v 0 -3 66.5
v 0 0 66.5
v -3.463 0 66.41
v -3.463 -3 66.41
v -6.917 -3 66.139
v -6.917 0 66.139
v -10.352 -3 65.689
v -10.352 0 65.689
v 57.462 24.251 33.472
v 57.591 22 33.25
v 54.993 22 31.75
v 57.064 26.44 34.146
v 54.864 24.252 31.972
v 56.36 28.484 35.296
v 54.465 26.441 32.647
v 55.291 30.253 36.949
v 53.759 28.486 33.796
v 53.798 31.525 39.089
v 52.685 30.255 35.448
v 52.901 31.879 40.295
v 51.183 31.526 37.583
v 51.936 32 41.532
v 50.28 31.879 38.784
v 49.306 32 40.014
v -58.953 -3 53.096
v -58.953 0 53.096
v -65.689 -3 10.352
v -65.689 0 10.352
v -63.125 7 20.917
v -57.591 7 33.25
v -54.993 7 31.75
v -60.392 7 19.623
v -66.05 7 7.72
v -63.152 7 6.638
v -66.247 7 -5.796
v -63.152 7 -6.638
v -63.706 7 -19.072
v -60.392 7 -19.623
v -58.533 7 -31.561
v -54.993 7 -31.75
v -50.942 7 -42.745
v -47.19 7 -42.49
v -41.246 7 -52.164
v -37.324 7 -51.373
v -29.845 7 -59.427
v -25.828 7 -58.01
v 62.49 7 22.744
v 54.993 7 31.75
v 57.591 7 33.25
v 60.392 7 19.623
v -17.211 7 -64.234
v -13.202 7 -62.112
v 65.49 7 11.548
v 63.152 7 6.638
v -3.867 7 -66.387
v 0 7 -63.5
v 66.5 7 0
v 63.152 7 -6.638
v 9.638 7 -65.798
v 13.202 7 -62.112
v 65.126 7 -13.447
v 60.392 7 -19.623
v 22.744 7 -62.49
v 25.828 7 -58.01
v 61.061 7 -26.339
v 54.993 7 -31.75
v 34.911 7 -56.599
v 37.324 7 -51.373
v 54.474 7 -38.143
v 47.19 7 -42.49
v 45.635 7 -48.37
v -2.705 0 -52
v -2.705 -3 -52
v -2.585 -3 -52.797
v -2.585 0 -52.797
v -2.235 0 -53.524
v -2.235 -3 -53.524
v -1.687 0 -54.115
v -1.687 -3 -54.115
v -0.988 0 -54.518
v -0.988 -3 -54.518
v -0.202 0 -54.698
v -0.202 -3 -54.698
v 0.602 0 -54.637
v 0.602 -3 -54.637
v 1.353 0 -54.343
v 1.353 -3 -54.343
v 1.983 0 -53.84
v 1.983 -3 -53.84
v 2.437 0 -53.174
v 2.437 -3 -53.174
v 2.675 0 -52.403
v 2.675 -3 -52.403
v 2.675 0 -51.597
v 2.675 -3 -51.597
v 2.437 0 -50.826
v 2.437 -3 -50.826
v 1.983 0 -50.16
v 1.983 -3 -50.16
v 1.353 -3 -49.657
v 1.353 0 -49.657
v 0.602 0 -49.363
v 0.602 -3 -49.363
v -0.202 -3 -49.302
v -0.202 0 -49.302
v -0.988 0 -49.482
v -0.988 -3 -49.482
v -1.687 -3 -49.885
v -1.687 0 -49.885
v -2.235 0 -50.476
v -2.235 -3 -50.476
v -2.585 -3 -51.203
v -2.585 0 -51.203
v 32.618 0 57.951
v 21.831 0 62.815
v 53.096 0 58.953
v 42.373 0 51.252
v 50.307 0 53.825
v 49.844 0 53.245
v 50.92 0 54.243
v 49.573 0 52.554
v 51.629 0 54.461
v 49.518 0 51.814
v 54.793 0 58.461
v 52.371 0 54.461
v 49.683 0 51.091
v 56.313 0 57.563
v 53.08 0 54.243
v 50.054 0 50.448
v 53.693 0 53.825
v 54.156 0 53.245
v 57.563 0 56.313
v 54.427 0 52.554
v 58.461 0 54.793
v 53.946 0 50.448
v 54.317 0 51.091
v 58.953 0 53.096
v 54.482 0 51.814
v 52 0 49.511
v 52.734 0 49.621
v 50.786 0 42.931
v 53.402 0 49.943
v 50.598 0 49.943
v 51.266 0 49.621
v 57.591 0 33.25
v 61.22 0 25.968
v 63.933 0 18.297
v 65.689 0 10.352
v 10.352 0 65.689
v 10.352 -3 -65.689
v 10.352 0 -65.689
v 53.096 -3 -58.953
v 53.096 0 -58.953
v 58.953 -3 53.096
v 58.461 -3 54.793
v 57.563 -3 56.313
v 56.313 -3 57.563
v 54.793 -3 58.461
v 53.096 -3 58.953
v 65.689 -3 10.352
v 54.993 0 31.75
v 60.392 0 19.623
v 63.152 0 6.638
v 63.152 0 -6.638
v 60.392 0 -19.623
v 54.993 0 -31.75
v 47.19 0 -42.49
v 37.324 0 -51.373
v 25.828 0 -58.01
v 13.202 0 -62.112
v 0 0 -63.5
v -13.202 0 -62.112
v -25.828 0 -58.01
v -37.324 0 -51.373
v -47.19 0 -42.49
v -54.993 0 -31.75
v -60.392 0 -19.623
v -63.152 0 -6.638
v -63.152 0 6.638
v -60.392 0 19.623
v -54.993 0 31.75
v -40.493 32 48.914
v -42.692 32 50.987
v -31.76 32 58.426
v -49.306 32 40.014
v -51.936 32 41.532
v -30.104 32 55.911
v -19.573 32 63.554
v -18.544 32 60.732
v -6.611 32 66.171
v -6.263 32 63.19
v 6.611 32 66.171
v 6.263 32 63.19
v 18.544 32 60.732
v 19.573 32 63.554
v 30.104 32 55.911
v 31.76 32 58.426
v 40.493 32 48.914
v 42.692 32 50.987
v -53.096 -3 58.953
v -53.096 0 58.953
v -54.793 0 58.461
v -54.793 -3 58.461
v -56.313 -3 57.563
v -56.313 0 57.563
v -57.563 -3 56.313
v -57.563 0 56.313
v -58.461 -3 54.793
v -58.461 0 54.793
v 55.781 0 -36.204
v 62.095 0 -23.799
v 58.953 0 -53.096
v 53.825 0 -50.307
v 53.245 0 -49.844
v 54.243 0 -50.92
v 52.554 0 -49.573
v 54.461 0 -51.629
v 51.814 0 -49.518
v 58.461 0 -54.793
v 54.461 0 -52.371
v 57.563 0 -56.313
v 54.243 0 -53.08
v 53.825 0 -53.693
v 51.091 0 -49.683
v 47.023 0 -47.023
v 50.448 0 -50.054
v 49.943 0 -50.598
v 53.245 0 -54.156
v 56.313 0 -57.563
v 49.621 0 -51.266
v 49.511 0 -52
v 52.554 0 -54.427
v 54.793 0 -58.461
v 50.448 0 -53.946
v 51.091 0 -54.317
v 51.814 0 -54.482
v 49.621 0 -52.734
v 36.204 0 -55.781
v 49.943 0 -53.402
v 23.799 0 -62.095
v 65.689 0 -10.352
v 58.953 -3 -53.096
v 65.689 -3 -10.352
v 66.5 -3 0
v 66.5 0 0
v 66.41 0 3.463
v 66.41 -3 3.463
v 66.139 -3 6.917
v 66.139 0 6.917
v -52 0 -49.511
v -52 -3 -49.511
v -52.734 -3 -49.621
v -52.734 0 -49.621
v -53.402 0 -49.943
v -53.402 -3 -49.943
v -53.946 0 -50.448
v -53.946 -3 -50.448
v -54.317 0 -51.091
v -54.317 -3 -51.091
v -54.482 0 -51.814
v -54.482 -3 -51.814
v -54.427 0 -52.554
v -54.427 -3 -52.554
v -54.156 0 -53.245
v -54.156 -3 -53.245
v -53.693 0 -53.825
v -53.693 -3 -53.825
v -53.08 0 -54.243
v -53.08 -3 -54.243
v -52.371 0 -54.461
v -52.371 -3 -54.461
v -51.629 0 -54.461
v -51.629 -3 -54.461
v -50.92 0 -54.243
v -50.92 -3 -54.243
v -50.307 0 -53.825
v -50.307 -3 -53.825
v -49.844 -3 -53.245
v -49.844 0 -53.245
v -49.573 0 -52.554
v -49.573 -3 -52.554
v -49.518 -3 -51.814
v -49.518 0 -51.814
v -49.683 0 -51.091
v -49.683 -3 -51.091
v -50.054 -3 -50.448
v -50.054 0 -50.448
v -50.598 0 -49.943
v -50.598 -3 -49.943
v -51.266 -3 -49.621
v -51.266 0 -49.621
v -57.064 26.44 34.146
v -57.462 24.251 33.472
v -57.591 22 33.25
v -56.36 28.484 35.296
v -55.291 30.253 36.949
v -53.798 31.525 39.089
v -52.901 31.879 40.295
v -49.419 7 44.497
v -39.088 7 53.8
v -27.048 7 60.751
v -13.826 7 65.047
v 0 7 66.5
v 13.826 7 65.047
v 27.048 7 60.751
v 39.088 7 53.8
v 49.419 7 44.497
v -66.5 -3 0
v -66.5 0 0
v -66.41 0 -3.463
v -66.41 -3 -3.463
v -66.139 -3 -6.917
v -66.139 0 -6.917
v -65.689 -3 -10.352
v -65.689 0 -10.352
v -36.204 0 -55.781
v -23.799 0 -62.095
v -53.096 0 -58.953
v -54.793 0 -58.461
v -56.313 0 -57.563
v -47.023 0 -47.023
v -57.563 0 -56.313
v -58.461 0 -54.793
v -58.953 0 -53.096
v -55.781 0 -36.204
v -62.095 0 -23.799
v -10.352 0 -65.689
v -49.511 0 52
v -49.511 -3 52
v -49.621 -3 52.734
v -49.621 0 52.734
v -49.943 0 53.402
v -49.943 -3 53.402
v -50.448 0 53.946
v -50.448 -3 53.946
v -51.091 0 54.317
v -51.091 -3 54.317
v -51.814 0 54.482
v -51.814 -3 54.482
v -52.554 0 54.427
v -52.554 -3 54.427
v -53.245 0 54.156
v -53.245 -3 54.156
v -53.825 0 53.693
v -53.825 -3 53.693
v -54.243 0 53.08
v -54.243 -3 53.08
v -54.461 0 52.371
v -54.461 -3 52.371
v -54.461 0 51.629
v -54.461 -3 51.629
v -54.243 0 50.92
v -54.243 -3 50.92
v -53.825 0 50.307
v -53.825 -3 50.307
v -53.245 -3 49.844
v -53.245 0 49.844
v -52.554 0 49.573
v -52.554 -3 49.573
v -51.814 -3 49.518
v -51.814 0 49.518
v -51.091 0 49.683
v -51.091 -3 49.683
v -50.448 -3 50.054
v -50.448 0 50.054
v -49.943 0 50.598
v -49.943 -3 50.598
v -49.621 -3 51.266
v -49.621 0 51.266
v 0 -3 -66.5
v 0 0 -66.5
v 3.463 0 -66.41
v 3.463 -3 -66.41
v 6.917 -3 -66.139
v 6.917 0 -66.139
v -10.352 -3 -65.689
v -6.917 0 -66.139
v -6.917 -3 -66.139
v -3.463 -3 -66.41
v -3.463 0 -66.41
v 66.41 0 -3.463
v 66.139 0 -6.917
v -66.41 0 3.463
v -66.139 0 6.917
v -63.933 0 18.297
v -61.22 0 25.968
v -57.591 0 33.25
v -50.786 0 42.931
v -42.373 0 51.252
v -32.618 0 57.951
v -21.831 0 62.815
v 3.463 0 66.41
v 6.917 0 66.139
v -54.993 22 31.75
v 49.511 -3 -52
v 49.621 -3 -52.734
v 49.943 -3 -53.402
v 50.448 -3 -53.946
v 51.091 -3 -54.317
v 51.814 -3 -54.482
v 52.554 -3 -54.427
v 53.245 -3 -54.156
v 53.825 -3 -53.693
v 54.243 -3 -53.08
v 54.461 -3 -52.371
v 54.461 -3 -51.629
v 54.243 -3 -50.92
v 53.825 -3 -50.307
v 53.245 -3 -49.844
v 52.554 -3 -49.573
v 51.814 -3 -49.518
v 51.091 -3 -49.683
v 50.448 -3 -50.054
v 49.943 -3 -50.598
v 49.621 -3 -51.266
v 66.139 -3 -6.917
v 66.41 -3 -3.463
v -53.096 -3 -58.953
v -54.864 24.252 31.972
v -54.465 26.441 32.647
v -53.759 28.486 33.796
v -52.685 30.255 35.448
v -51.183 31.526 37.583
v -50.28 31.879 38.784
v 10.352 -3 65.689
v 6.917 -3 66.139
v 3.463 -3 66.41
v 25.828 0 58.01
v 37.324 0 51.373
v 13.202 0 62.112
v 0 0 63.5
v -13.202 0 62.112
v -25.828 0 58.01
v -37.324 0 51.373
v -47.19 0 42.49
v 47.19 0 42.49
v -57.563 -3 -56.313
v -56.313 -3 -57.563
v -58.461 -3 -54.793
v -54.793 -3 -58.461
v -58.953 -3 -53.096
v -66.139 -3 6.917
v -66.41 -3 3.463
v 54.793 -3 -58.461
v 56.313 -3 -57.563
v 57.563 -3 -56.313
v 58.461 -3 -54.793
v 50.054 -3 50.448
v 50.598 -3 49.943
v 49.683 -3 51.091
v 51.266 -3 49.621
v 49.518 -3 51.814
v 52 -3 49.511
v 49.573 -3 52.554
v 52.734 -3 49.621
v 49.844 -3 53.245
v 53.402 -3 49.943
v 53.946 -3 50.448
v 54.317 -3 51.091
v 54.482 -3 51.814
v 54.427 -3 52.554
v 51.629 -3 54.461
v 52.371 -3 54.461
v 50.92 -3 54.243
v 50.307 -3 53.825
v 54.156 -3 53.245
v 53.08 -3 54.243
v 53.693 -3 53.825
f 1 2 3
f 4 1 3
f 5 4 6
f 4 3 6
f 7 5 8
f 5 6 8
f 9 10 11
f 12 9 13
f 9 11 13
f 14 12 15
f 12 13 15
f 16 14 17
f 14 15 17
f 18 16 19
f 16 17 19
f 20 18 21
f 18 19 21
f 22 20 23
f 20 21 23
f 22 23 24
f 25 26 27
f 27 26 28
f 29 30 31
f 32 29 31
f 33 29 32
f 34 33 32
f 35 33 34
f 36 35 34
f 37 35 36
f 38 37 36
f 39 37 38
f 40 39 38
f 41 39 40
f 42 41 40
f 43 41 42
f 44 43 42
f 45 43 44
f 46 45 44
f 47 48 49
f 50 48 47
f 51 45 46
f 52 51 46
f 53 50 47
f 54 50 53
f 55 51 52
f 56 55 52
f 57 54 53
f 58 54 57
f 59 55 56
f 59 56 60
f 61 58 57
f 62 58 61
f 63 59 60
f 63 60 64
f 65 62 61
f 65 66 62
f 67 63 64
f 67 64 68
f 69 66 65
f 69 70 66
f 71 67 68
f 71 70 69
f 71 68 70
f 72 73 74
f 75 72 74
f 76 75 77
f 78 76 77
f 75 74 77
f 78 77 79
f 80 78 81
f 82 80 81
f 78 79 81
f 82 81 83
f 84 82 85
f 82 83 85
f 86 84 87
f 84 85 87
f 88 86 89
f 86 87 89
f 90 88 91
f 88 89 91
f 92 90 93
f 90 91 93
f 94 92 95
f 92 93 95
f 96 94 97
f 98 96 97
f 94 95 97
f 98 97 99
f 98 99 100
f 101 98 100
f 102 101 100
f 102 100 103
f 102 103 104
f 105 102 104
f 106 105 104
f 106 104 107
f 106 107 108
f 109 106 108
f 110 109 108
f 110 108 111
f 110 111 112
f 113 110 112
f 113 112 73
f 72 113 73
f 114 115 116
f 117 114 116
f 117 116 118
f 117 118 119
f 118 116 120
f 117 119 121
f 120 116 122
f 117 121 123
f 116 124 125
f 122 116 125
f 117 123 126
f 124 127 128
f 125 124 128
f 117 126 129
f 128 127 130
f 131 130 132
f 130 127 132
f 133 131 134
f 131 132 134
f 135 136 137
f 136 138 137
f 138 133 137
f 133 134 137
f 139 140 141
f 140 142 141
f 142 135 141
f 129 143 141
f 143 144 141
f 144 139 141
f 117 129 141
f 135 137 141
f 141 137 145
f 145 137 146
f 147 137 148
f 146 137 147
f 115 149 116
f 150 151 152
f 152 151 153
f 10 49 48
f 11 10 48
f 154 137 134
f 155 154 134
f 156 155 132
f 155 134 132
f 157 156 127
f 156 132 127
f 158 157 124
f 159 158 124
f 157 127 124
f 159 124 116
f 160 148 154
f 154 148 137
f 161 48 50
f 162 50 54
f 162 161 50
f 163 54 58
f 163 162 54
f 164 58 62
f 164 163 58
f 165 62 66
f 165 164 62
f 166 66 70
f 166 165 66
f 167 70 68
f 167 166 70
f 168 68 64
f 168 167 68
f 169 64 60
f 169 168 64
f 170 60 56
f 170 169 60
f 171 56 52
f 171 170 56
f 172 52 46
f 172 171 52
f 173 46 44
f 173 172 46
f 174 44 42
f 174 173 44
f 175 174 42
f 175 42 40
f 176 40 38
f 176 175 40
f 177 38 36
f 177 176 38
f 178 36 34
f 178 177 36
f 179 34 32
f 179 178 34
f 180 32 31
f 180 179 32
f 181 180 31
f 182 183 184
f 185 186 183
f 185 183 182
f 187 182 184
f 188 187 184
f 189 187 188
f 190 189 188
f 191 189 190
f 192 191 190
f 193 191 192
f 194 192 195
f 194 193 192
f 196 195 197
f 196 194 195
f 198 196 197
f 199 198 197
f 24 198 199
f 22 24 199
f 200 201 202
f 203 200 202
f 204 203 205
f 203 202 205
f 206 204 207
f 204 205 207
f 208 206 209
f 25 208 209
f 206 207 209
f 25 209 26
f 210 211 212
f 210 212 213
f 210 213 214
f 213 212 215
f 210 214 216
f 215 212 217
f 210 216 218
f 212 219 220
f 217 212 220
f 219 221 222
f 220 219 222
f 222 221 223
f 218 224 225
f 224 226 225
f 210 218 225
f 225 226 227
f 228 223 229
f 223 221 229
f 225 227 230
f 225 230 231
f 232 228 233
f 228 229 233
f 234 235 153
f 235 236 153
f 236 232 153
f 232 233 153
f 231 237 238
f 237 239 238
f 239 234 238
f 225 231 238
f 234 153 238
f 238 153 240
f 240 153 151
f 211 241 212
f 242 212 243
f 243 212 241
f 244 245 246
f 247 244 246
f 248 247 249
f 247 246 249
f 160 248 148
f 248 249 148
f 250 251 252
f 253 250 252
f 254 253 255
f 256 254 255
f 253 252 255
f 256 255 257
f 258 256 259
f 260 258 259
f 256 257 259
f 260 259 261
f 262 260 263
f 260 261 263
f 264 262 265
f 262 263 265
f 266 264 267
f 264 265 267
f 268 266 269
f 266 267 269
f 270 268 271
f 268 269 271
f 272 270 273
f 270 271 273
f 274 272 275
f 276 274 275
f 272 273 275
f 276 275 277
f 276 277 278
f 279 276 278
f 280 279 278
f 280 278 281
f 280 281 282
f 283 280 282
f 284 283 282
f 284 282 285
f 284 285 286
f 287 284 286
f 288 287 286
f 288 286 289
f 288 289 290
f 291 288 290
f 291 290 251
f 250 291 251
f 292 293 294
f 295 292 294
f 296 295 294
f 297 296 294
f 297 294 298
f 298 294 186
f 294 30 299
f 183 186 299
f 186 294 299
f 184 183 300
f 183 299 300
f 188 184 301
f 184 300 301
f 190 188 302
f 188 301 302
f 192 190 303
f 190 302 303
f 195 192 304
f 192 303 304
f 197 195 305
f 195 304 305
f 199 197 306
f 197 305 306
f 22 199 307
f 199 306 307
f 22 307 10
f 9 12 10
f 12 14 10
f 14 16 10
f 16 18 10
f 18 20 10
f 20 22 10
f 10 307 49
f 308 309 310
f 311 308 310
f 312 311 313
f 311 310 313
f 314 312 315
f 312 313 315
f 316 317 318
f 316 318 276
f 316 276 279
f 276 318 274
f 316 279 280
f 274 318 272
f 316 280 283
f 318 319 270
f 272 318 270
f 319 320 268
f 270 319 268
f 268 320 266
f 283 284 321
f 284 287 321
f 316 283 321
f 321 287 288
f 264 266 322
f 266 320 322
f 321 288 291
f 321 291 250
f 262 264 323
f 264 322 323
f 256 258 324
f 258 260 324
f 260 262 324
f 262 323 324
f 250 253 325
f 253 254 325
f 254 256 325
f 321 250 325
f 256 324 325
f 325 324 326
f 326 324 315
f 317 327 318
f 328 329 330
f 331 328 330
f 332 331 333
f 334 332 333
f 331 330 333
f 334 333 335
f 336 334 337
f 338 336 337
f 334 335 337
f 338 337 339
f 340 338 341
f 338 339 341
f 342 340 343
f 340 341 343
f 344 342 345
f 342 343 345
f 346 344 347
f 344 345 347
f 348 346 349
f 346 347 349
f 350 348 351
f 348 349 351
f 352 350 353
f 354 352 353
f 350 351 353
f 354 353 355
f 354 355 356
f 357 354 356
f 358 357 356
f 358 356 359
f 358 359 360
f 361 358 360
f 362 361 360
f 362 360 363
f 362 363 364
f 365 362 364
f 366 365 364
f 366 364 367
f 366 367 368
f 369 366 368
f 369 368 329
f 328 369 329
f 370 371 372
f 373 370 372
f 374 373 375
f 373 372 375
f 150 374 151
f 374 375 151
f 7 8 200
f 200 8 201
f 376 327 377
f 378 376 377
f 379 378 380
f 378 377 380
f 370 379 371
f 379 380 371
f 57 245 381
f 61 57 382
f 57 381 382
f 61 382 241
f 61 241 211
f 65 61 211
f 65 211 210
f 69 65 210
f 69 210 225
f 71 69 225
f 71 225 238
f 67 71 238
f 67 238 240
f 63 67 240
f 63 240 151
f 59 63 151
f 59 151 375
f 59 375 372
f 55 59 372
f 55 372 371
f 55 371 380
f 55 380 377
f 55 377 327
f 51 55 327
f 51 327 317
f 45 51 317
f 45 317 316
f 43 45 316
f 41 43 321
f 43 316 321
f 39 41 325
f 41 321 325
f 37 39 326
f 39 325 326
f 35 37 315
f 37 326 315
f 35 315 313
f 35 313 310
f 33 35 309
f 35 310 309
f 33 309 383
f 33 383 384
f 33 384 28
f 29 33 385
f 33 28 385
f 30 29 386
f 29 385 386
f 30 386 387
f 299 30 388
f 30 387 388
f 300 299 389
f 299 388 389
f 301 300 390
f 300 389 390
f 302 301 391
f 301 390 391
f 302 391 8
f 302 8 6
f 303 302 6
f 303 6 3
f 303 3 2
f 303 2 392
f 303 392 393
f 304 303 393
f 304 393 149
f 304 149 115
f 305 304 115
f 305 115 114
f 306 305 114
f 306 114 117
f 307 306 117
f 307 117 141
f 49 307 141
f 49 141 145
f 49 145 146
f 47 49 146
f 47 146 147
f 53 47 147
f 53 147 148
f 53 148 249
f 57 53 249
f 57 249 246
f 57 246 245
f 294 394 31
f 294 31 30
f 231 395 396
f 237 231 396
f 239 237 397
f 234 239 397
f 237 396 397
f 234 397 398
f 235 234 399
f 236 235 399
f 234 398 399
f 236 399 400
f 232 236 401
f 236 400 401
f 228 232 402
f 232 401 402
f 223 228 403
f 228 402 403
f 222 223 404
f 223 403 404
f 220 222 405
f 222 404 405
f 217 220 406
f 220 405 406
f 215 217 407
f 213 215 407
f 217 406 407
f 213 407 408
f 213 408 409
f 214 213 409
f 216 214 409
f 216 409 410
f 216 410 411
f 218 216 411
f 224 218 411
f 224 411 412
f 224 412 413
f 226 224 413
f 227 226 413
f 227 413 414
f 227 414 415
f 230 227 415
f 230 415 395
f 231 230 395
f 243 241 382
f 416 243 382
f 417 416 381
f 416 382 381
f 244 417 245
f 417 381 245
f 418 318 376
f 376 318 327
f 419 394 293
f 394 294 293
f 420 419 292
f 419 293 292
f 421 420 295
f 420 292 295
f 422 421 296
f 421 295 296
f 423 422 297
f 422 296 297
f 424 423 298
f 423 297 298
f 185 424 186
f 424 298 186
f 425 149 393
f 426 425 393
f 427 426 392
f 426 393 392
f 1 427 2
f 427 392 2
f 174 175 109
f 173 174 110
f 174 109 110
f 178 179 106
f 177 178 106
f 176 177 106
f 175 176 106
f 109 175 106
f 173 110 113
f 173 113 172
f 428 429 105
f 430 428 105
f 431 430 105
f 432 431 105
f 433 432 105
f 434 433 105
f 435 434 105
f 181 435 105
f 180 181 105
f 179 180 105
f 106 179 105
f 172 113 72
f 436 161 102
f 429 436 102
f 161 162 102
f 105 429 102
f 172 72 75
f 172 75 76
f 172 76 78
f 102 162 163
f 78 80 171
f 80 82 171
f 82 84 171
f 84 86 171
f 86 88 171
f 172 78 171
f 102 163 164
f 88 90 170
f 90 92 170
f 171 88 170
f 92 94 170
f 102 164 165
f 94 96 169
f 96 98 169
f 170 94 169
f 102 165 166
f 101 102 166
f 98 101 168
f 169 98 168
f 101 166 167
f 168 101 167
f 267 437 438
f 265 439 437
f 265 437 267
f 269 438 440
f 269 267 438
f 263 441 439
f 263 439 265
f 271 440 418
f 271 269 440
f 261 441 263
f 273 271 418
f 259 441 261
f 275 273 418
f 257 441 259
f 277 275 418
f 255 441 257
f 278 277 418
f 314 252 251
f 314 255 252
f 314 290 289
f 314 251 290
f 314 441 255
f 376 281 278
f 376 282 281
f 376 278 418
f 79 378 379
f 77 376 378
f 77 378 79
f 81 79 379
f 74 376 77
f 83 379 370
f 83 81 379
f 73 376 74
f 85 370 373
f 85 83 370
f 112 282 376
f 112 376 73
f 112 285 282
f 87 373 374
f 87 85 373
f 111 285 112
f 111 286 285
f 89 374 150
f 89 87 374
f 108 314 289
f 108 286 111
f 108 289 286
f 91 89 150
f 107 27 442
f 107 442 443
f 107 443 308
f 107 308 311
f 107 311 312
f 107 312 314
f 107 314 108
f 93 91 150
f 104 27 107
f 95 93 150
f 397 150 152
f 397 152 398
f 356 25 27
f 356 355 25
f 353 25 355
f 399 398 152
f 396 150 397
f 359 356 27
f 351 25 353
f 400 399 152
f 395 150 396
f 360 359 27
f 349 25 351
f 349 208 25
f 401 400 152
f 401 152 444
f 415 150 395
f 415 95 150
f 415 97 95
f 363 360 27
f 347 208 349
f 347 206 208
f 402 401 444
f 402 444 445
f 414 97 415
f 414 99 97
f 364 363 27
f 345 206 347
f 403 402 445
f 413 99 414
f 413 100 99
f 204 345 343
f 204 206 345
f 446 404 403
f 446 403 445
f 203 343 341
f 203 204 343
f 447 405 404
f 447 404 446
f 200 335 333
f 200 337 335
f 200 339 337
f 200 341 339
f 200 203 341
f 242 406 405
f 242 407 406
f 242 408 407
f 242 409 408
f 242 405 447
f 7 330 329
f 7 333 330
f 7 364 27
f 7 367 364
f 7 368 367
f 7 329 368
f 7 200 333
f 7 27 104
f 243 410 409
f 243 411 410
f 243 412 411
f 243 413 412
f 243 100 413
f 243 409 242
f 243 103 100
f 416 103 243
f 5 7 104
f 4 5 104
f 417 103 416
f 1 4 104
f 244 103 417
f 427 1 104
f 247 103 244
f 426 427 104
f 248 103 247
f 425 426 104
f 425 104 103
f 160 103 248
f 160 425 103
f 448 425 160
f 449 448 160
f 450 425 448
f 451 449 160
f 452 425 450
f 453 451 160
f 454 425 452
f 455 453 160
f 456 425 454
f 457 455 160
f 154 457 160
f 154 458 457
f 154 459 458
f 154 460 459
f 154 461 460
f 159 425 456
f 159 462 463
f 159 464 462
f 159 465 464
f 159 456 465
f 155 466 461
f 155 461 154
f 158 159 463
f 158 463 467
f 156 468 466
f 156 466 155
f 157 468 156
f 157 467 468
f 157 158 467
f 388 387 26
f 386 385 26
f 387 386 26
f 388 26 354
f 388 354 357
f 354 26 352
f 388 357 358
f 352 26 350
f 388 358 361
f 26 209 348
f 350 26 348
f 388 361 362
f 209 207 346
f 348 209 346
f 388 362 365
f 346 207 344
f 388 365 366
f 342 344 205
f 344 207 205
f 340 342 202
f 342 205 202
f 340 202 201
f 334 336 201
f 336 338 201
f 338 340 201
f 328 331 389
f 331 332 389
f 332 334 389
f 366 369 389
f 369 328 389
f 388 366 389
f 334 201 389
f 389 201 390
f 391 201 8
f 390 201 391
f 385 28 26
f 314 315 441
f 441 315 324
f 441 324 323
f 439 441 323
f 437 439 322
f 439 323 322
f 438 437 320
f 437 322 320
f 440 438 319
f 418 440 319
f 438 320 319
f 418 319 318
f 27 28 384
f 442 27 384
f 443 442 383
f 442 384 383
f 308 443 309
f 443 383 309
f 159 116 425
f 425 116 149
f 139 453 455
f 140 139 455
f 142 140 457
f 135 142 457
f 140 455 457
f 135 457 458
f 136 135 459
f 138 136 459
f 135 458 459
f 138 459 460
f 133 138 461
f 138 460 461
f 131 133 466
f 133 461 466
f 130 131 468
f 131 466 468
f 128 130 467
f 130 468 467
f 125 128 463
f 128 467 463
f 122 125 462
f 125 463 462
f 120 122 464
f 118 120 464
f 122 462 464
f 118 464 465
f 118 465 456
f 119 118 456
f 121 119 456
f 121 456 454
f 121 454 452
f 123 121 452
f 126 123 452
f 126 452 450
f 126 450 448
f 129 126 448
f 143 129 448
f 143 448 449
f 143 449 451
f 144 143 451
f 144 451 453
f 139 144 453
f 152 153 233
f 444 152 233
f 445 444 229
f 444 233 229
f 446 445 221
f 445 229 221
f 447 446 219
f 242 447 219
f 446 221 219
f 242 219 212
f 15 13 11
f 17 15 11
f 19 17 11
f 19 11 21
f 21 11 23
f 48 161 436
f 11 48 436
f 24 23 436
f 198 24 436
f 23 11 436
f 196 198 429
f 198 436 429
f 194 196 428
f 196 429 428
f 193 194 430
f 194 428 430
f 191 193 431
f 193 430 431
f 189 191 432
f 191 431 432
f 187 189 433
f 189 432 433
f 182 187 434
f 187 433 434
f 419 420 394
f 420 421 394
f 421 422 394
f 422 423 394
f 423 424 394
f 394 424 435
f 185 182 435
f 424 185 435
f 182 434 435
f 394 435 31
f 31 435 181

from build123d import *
from build123d.topology import SkipClean

# Parameters (mm, degrees)
SKETCH1_R               = 66.5
SKETCH1_R_2             = 63.5
EXTRUDE_THIN1_DEPTH     = 7
BOSS_EXTRUDE1_DEPTH     = 32
BOSS_EXTRUDE2_DEPTH     = 3
F_10_CLEARANCE_HOLE1_D  = 4.9784
CIRPATTERN1_COUNT       = 4
FILLET1_R               = 10
F_1_4_28_TAPPED_HOLE1_D = 5.4102


with BuildPart() as part:
    # Sketch1 → Extrude-Thin1 (new body)
    with BuildSketch(Plane(origin=(0, 0, 0), x_dir=(1, 0, 0), z_dir=(0, 1, 0))):
        Circle(SKETCH1_R)
        Circle(SKETCH1_R_2, mode=Mode.SUBTRACT)
    extrude(amount=EXTRUDE_THIN1_DEPTH)

    # Sketch2 → Boss-Extrude1 (add)
    with BuildSketch(Plane(origin=(0, 0, 0), x_dir=(1, 0, 0), z_dir=(0, 1, 0))):
        with BuildLine():
            Line((-54.99261314, -31.75), (-57.590689352, -33.25))
            ThreePointArc((-57.590689352, -33.25), (0, -66.5), (57.590689352, -33.25))
            Line((57.590689352, -33.25), (54.99261314, -31.75))
            ThreePointArc((54.99261314, -31.75), (0, -63.5), (-54.99261314, -31.75))
        make_face()
    extrude(amount=BOSS_EXTRUDE1_DEPTH)

    # Sketch3 → Boss-Extrude2 (add)
    with BuildSketch(Plane(origin=(0, 0, 0), x_dir=(1, 0, 0), z_dir=(0, 1, 0))):
        with BuildLine():
            Line((0, 0), (0, 66.5))
            ThreePointArc((0, 66.5), (5.191860277, 66.297017933), (10.352025681, 65.689310883))
            Line((10.352025681, 65.689310883), (53.09577441, 58.953292822))
            ThreePointArc((53.09577441, 58.953292822), (56.977399051, 56.977399051), (58.953292822, 53.09577441))
            Line((58.953292822, 53.09577441), (65.689310883, 10.352025681))
            ThreePointArc((65.689310883, 10.352025681), (66.297017933, 5.191860277), (66.5, 0))
            Line((66.5, 0), (0, 0))
        make_face()
    boss_extrude2 = extrude(amount=-BOSS_EXTRUDE2_DEPTH)

    # #10 Clearance Hole1 (through all)
    with Locations(Plane(origin=(0, 0, 0), x_dir=(1, 0, 0), z_dir=(0, 1, 0))):
        with Locations((52, 52)):
            f_10_clearance_hole1 = Hole(F_10_CLEARANCE_HOLE1_D / 2)

    # CirPattern1: Boss-Extrude2, #10 Clearance Hole1 ×4 about axis
    with SkipClean():  # keep this step's faces unmerged: merging them makes the solid invalid here
        cirpattern1_axis = Axis((0, 0, 0), (0, 1, 0))
        add([boss_extrude2.rotate(cirpattern1_axis, i * 360 / CIRPATTERN1_COUNT) for i in range(1, CIRPATTERN1_COUNT)])
        add([f_10_clearance_hole1.rotate(cirpattern1_axis, i * 360 / CIRPATTERN1_COUNT) for i in range(1, CIRPATTERN1_COUNT)], mode=Mode.SUBTRACT)

    # Fillet1
    fillet1_edges = [part.edges().sort_by_distance(p)[0] for p in [
        (-56.291651246, 32, 32.5),
        (56.291651246, 32, 32.5),
    ]]
    fillet(fillet1_edges, radius=FILLET1_R)

    # 1/4-28 Tapped Hole1 (through all)
    with Locations(Plane(origin=(0, 0, 0), x_dir=(1, 0, 0), z_dir=(0, 1, 0))):
        with Locations((0, 52)):
            Hole(F_1_4_28_TAPPED_HOLE1_D / 2)


solid = part.part
